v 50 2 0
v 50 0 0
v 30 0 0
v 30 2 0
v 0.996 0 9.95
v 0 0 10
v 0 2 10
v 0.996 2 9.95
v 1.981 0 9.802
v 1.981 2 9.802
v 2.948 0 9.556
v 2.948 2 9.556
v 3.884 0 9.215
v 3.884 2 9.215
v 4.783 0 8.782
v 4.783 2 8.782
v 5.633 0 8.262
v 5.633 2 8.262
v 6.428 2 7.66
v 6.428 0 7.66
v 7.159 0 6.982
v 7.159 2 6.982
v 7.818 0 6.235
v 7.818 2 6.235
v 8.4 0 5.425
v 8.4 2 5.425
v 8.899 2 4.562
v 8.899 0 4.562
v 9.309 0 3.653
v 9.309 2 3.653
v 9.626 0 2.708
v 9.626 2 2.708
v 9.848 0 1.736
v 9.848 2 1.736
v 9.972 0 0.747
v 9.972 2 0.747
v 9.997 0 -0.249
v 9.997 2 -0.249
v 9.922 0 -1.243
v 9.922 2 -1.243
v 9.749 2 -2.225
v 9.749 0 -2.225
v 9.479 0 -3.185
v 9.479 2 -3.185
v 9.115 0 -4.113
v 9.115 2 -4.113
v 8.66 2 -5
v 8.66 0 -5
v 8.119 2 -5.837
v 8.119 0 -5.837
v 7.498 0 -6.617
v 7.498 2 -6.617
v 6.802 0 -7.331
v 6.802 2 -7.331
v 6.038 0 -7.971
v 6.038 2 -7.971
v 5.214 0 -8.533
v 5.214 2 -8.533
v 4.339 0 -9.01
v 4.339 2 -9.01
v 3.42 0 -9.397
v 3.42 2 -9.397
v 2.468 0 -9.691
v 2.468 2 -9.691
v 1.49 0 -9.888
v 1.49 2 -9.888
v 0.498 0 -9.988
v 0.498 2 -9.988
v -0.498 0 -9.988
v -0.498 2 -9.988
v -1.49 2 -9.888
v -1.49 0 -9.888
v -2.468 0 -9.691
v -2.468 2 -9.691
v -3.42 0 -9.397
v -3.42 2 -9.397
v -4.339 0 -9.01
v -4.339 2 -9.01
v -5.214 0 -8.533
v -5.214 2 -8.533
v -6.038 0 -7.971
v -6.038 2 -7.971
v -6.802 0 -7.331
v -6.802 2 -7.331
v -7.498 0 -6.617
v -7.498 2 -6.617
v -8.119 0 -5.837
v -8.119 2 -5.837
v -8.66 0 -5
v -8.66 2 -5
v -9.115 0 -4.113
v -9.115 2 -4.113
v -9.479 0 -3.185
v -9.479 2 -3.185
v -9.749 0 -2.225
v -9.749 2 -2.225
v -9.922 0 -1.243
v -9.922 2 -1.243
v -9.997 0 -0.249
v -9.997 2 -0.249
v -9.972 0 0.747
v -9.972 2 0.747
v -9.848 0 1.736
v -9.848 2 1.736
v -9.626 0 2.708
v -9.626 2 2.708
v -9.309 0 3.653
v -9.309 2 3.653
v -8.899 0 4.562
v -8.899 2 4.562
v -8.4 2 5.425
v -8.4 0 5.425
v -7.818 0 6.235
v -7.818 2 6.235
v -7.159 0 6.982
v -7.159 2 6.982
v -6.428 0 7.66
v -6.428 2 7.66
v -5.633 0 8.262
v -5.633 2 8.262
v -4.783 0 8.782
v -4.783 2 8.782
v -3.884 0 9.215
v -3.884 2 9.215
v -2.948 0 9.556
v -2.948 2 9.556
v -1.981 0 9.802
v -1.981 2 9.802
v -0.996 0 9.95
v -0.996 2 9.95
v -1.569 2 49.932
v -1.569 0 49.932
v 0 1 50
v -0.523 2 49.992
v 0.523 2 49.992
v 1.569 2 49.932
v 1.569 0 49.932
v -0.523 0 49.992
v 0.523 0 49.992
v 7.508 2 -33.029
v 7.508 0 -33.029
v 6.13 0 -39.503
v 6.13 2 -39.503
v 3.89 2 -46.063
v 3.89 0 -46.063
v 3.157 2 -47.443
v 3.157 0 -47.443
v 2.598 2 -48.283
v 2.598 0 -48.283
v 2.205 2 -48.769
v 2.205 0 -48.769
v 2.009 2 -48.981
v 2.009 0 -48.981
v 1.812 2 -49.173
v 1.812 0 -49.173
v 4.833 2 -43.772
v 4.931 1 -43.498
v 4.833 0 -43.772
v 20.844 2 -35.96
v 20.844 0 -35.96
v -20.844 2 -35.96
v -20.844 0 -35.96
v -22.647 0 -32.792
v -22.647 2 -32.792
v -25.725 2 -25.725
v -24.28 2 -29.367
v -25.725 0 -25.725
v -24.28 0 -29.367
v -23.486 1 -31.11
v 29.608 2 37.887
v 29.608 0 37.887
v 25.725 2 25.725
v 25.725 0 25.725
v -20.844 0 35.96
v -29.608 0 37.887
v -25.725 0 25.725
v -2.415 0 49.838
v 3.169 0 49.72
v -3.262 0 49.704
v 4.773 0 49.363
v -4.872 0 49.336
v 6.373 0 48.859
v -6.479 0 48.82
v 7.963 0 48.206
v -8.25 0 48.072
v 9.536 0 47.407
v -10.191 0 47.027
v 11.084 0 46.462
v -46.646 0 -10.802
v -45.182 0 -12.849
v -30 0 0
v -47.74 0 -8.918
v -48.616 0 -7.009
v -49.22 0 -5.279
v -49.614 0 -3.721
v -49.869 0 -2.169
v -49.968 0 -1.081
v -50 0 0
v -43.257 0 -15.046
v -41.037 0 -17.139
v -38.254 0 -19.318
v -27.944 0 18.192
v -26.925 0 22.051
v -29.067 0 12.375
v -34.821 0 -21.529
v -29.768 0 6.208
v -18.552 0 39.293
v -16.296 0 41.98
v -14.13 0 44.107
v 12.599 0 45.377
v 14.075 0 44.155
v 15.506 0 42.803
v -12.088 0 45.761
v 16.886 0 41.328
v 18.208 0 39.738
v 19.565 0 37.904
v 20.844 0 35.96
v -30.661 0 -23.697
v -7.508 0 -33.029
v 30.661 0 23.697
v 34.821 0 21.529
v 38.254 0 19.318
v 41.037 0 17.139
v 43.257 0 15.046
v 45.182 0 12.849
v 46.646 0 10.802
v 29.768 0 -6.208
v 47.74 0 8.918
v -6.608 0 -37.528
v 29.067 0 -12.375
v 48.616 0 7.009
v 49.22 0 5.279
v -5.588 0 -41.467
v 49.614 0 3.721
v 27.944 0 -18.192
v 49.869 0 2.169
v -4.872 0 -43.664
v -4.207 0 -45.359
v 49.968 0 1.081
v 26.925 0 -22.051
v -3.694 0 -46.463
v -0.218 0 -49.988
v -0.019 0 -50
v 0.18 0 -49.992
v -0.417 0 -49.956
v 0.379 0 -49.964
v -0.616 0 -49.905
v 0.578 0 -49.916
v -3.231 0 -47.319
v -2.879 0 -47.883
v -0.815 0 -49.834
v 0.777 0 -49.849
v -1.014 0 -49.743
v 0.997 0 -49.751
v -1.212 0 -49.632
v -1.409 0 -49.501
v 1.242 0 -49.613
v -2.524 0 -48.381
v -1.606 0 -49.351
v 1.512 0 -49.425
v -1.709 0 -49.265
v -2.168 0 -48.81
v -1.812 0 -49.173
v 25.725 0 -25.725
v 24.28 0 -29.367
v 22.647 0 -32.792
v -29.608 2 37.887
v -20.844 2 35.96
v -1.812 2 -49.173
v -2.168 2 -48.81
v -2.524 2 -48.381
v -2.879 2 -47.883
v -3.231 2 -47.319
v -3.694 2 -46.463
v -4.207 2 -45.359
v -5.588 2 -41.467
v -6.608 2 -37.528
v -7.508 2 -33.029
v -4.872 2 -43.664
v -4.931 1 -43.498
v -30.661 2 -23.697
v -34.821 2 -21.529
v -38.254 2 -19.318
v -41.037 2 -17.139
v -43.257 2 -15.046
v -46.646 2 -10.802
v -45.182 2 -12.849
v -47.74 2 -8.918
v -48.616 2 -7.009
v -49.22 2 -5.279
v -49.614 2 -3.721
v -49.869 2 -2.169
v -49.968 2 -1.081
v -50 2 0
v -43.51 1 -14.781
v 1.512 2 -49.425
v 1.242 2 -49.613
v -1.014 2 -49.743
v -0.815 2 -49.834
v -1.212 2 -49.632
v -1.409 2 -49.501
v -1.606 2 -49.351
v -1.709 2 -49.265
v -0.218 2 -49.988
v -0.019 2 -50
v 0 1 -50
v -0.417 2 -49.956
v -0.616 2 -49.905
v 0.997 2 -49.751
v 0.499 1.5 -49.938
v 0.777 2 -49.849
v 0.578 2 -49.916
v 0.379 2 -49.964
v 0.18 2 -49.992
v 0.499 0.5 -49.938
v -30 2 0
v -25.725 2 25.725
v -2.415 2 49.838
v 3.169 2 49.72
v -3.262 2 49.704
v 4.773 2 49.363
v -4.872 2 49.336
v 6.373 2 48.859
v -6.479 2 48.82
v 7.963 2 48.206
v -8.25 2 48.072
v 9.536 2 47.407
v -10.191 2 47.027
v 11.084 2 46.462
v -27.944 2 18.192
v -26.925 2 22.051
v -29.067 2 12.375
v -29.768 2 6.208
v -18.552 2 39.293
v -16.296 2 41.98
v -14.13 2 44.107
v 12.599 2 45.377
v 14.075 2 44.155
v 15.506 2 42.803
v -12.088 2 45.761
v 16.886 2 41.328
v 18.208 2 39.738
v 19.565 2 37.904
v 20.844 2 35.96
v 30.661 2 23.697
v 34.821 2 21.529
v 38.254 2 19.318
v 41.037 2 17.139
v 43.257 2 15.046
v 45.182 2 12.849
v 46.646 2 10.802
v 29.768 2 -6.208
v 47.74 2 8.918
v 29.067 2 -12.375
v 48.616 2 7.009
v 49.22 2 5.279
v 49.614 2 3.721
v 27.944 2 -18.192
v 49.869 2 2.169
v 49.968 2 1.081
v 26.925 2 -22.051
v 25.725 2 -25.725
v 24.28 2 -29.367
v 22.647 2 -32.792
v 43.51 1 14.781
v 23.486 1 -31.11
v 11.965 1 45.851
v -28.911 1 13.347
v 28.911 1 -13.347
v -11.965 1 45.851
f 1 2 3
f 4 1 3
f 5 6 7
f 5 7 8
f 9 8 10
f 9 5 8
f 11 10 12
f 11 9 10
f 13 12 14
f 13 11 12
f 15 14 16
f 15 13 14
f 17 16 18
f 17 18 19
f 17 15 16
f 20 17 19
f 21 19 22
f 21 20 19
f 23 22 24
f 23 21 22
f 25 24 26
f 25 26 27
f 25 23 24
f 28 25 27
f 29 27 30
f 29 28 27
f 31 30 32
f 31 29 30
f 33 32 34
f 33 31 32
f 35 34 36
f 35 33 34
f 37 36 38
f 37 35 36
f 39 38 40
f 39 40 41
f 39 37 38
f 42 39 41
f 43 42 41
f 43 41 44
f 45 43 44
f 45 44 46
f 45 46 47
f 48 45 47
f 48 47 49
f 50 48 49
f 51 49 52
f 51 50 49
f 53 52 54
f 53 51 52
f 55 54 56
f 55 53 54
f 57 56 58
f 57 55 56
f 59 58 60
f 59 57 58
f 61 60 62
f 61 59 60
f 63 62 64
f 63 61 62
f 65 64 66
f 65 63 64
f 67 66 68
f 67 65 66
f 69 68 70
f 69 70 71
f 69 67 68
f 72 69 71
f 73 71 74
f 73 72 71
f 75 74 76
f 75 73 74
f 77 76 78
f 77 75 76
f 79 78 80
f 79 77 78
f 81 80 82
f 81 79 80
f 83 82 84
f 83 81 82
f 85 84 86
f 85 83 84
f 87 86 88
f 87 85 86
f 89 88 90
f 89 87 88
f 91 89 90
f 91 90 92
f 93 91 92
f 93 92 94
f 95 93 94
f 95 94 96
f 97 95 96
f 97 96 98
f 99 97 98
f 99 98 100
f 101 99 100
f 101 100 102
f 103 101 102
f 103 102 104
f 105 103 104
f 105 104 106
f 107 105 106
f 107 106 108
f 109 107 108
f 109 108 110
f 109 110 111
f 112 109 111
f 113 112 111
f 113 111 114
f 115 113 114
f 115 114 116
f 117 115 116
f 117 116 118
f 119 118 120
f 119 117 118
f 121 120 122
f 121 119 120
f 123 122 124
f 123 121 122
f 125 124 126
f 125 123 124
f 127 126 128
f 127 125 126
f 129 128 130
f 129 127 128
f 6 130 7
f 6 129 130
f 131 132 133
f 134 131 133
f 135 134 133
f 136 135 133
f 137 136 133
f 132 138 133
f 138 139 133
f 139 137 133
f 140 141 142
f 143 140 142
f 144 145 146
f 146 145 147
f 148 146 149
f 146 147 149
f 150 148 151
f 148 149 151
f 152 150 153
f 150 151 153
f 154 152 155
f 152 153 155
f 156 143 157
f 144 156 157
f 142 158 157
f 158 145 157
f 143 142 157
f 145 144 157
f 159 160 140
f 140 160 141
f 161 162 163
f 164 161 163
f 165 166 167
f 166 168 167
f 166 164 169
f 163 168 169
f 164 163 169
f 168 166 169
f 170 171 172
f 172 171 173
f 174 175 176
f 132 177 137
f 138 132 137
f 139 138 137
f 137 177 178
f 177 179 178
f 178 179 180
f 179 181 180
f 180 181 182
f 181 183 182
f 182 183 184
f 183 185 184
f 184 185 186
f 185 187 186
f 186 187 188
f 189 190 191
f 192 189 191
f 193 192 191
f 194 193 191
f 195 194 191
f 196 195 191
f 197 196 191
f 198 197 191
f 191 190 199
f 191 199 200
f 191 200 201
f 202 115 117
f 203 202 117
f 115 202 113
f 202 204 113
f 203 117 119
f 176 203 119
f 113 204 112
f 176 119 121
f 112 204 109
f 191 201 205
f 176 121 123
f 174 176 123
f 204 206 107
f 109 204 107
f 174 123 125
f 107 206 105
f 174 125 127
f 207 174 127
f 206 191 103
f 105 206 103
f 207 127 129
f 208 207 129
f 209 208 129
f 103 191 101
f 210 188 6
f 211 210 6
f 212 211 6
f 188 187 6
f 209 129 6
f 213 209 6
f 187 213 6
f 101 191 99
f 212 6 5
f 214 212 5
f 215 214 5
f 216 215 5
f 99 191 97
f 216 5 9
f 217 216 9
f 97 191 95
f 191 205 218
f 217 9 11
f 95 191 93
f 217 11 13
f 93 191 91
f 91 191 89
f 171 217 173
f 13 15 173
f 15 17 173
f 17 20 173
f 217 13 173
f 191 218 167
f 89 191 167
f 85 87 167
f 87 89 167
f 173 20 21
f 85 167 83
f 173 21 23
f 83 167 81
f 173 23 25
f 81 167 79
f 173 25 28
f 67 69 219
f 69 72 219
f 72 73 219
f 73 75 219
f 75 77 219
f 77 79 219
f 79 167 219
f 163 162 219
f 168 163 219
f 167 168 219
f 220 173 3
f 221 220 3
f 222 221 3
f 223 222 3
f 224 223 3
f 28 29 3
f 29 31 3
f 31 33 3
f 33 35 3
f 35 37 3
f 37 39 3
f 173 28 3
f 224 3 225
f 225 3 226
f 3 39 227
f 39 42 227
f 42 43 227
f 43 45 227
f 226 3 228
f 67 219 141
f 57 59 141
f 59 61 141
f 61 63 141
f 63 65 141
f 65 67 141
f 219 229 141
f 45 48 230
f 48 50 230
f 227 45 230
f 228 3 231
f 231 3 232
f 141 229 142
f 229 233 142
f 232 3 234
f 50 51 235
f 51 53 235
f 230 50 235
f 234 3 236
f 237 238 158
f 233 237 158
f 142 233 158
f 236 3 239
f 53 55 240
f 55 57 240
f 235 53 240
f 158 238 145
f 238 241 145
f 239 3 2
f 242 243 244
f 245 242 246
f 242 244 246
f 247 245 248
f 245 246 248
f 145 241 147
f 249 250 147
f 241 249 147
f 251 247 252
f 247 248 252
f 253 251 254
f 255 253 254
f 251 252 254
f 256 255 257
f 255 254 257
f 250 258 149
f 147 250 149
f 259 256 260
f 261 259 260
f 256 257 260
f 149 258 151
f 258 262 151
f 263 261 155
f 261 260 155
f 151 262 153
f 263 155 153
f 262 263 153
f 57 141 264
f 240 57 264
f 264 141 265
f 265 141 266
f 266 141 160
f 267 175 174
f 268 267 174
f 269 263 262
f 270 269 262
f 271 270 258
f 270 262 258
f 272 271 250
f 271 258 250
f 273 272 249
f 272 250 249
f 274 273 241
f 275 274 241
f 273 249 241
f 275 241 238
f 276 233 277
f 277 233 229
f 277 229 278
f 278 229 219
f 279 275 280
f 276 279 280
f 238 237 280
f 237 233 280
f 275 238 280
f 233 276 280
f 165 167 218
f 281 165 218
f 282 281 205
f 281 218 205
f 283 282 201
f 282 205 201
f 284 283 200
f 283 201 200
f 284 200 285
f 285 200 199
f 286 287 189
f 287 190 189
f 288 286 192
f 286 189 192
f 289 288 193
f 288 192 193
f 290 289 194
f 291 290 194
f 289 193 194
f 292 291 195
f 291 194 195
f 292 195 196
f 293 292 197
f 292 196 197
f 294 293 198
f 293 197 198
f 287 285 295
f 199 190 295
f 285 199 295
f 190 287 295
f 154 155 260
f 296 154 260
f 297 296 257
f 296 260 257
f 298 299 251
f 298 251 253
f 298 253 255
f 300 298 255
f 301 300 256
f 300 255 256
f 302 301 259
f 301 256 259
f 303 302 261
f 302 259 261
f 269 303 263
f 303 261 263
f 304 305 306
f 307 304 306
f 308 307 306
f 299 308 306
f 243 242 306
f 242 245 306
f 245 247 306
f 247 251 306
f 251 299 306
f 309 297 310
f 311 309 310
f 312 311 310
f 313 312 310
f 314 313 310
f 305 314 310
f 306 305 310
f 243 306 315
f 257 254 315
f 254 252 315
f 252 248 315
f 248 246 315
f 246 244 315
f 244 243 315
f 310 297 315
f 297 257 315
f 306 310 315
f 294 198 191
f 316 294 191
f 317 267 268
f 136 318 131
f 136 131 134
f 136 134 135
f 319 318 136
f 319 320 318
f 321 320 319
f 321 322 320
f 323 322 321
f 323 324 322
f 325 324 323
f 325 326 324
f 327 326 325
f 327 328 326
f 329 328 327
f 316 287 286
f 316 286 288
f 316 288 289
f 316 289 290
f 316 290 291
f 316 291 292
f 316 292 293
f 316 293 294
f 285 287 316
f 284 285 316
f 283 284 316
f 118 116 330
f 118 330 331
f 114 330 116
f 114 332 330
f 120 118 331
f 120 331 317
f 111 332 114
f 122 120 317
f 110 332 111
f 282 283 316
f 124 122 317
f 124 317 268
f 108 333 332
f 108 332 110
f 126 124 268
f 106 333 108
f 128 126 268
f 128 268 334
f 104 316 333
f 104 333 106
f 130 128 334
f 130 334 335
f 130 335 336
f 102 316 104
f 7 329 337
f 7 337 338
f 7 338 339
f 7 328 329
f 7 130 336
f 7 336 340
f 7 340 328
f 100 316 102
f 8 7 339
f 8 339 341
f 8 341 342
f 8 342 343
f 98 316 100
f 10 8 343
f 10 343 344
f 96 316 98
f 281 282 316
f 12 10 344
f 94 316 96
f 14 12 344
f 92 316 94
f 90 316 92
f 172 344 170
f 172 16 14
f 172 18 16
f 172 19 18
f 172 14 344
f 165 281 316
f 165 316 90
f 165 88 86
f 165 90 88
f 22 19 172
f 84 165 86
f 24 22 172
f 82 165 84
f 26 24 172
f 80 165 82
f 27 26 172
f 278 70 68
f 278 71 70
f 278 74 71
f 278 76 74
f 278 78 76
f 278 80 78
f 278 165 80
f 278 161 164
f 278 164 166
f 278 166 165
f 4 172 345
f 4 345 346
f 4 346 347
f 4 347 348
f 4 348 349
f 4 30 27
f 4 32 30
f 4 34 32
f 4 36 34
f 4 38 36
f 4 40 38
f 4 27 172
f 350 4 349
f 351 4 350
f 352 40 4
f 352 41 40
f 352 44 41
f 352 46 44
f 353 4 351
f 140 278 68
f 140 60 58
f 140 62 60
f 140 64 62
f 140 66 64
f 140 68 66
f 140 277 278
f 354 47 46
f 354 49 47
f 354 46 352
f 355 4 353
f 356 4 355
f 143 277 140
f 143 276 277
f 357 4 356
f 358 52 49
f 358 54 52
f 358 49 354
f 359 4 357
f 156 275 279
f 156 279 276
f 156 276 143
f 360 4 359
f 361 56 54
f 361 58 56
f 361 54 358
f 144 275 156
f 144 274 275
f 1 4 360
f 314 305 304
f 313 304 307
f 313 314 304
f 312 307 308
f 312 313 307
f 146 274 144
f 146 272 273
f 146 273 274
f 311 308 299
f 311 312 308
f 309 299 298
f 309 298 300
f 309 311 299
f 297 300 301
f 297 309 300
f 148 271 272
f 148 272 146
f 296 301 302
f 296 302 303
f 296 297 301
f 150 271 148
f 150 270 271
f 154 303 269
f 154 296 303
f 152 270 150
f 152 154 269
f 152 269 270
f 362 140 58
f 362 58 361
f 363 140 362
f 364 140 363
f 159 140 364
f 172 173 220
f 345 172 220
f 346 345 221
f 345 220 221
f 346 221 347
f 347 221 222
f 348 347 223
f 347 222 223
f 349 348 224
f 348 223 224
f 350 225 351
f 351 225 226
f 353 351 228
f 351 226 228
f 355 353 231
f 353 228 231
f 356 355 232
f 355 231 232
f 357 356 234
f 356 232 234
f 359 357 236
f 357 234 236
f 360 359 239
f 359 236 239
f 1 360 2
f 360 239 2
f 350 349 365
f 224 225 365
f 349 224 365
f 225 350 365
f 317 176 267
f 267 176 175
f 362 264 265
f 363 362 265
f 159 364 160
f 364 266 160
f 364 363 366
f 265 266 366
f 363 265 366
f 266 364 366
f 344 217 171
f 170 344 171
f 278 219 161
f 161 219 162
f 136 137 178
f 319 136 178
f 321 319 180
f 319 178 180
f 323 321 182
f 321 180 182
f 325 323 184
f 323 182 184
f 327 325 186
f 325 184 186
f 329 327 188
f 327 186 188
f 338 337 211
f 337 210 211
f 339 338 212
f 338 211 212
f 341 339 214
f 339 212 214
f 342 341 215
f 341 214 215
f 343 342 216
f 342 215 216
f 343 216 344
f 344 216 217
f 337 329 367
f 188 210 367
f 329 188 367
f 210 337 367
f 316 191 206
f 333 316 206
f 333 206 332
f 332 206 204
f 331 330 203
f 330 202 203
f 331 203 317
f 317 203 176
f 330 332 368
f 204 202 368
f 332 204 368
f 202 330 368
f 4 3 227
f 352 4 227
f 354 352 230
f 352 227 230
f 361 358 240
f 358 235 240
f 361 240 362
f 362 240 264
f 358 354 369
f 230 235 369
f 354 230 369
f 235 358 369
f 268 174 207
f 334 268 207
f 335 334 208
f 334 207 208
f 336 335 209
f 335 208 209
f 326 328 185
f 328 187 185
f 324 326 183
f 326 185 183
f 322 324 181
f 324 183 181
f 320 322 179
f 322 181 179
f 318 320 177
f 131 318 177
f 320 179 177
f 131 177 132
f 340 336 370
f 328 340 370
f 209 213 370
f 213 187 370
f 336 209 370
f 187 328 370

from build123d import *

# Parameters (mm, degrees)
SZKIC1_R                    = 10
DODANIE_WYCI_GNI_CIE1_DEPTH = 2


with BuildPart() as part:
    # Szkic1 → Dodanie-wyciągnięcie1 (new body)
    with BuildSketch(Plane(origin=(0, 0, 0), x_dir=(1, 0, 0), z_dir=(0, 1, 0))):
        with BuildLine():
            add(Edge.make_bspline(
                [(25.724787771, -25.724787771), (50, -16.985711369), (50, 0)],
                knots=[5.252808481, 5.252808481, 5.252808481, 6.283185307, 6.283185307, 6.283185307], degree=2, weights=[1, 0.870199907, 1]))
            Line((50, 0), (30, 0))
            add(Edge.make_bspline(
                [(30, 0), (30, 13.849198247), (25.724787771, 25.724787771)],
                knots=[1.570796327, 1.570796327, 1.570796327, 2.111215827, 2.111215827, 2.111215827], degree=2, weights=[1, 0.963714928, 1]))
            add(Edge.make_bspline(
                [(25.724787771, 25.724787771), (23.68927397, 31.378992774), (20.843852414, 35.960387795)],
                knots=[2.111215827, 2.111215827, 2.111215827, 2.373457716, 2.373457716, 2.373457716], degree=2, weights=[1, 0.991415958, 1]))
            Line((20.843852414, 35.960387795), (7.507535684, 33.029118956))
            add(Edge.make_bspline(
                [(7.507535684, 33.029118956), (5.218865934, 46.034514162), (1.811566447, 49.17271271)],
                knots=[5.433983203, 5.433983203, 5.433983203, 6.101022879, 6.101022879, 6.101022879], degree=2, weights=[1, 0.944895907, 1]))
            add(Edge.make_bspline(
                [(1.811566447, 49.17271271), (0.913339162, 50), (0, 50)],
                knots=[6.101022879, 6.101022879, 6.101022879, 6.283185307, 6.283185307, 6.283185307], degree=2, weights=[1, 0.995854973, 1]))
            add(Edge.make_bspline(
                [(0, 50), (-0.913339162, 50), (-1.811566447, 49.17271271)],
                knots=[0, 0, 0, 0.182162428, 0.182162428, 0.182162428], degree=2, weights=[1, 0.995854973, 1]))
            add(Edge.make_bspline(
                [(-1.811566447, 49.17271271), (-5.218865934, 46.034514162), (-7.507535684, 33.029118956)],
                knots=[0.182162428, 0.182162428, 0.182162428, 0.849202104, 0.849202104, 0.849202104], degree=2, weights=[1, 0.944895907, 1]))
            Line((-7.507535684, 33.029118956), (-20.843852414, 35.960387795))
            add(Edge.make_bspline(
                [(-20.843852414, 35.960387795), (-23.68927397, 31.378992774), (-25.724787771, 25.724787771)],
                knots=[3.909727591, 3.909727591, 3.909727591, 4.17196948, 4.17196948, 4.17196948], degree=2, weights=[1, 0.991415958, 1]))
            add(Edge.make_bspline(
                [(-25.724787771, 25.724787771), (-50, 16.985711369), (-50, 0)],
                knots=[2.111215827, 2.111215827, 2.111215827, 3.141592654, 3.141592654, 3.141592654], degree=2, weights=[1, 0.870199907, 1]))
            Line((-50, 0), (-30, 0))
            add(Edge.make_bspline(
                [(-30, 9.5e-08), (-30.000000016, -13.849198204), (-25.724787771, -25.724787771)],
                knots=[4.712388978, 4.712388978, 4.712388978, 5.252808481, 5.252808481, 5.252808481], degree=2, weights=[1, 0.963714928, 1]))
            Line((-25.724787771, -25.724787771), (-29.607826273, -37.88667404))
            Line((-29.607826273, -37.88667404), (-20.843852414, -35.960387795))
            add(Edge.make_bspline(
                [(-20.843852414, -35.960387795), (-12.774167321, -48.953336072), (-1.56928672, -49.931545896)],
                knots=[5.51505037, 5.51505037, 5.51505037, 6.230851865, 6.230851865, 6.230851865], degree=2, weights=[1, 0.936634273, 1]))
            add(Edge.make_bspline(
                [(-1.56928672, -49.931545896), (-0.785180849, -50), (0, -50)],
                knots=[6.230851865, 6.230851865, 6.230851865, 6.283185307, 6.283185307, 6.283185307], degree=2, weights=[1, 0.999657671, 1]))
            add(Edge.make_bspline(
                [(0, -50), (0.785180849, -50), (1.56928672, -49.931545896)],
                knots=[0, 0, 0, 0.052333442, 0.052333442, 0.052333442], degree=2, weights=[1, 0.999657671, 1]))
            add(Edge.make_bspline(
                [(1.56928672, -49.931545896), (12.774167321, -48.953336072), (20.843852414, -35.960387795)],
                knots=[0.052333442, 0.052333442, 0.052333442, 0.768134938, 0.768134938, 0.768134938], degree=2, weights=[1, 0.936634273, 1]))
            Line((20.843852414, -35.960387795), (29.607826273, -37.88667404))
            Line((29.607826273, -37.88667404), (25.724787771, -25.724787771))
        make_face()
        with Locations(Location((0, 0, 0), (0, 0, 270))):
            Circle(SZKIC1_R, mode=Mode.SUBTRACT)
    extrude(amount=DODANIE_WYCI_GNI_CIE1_DEPTH)


solid = part.part
